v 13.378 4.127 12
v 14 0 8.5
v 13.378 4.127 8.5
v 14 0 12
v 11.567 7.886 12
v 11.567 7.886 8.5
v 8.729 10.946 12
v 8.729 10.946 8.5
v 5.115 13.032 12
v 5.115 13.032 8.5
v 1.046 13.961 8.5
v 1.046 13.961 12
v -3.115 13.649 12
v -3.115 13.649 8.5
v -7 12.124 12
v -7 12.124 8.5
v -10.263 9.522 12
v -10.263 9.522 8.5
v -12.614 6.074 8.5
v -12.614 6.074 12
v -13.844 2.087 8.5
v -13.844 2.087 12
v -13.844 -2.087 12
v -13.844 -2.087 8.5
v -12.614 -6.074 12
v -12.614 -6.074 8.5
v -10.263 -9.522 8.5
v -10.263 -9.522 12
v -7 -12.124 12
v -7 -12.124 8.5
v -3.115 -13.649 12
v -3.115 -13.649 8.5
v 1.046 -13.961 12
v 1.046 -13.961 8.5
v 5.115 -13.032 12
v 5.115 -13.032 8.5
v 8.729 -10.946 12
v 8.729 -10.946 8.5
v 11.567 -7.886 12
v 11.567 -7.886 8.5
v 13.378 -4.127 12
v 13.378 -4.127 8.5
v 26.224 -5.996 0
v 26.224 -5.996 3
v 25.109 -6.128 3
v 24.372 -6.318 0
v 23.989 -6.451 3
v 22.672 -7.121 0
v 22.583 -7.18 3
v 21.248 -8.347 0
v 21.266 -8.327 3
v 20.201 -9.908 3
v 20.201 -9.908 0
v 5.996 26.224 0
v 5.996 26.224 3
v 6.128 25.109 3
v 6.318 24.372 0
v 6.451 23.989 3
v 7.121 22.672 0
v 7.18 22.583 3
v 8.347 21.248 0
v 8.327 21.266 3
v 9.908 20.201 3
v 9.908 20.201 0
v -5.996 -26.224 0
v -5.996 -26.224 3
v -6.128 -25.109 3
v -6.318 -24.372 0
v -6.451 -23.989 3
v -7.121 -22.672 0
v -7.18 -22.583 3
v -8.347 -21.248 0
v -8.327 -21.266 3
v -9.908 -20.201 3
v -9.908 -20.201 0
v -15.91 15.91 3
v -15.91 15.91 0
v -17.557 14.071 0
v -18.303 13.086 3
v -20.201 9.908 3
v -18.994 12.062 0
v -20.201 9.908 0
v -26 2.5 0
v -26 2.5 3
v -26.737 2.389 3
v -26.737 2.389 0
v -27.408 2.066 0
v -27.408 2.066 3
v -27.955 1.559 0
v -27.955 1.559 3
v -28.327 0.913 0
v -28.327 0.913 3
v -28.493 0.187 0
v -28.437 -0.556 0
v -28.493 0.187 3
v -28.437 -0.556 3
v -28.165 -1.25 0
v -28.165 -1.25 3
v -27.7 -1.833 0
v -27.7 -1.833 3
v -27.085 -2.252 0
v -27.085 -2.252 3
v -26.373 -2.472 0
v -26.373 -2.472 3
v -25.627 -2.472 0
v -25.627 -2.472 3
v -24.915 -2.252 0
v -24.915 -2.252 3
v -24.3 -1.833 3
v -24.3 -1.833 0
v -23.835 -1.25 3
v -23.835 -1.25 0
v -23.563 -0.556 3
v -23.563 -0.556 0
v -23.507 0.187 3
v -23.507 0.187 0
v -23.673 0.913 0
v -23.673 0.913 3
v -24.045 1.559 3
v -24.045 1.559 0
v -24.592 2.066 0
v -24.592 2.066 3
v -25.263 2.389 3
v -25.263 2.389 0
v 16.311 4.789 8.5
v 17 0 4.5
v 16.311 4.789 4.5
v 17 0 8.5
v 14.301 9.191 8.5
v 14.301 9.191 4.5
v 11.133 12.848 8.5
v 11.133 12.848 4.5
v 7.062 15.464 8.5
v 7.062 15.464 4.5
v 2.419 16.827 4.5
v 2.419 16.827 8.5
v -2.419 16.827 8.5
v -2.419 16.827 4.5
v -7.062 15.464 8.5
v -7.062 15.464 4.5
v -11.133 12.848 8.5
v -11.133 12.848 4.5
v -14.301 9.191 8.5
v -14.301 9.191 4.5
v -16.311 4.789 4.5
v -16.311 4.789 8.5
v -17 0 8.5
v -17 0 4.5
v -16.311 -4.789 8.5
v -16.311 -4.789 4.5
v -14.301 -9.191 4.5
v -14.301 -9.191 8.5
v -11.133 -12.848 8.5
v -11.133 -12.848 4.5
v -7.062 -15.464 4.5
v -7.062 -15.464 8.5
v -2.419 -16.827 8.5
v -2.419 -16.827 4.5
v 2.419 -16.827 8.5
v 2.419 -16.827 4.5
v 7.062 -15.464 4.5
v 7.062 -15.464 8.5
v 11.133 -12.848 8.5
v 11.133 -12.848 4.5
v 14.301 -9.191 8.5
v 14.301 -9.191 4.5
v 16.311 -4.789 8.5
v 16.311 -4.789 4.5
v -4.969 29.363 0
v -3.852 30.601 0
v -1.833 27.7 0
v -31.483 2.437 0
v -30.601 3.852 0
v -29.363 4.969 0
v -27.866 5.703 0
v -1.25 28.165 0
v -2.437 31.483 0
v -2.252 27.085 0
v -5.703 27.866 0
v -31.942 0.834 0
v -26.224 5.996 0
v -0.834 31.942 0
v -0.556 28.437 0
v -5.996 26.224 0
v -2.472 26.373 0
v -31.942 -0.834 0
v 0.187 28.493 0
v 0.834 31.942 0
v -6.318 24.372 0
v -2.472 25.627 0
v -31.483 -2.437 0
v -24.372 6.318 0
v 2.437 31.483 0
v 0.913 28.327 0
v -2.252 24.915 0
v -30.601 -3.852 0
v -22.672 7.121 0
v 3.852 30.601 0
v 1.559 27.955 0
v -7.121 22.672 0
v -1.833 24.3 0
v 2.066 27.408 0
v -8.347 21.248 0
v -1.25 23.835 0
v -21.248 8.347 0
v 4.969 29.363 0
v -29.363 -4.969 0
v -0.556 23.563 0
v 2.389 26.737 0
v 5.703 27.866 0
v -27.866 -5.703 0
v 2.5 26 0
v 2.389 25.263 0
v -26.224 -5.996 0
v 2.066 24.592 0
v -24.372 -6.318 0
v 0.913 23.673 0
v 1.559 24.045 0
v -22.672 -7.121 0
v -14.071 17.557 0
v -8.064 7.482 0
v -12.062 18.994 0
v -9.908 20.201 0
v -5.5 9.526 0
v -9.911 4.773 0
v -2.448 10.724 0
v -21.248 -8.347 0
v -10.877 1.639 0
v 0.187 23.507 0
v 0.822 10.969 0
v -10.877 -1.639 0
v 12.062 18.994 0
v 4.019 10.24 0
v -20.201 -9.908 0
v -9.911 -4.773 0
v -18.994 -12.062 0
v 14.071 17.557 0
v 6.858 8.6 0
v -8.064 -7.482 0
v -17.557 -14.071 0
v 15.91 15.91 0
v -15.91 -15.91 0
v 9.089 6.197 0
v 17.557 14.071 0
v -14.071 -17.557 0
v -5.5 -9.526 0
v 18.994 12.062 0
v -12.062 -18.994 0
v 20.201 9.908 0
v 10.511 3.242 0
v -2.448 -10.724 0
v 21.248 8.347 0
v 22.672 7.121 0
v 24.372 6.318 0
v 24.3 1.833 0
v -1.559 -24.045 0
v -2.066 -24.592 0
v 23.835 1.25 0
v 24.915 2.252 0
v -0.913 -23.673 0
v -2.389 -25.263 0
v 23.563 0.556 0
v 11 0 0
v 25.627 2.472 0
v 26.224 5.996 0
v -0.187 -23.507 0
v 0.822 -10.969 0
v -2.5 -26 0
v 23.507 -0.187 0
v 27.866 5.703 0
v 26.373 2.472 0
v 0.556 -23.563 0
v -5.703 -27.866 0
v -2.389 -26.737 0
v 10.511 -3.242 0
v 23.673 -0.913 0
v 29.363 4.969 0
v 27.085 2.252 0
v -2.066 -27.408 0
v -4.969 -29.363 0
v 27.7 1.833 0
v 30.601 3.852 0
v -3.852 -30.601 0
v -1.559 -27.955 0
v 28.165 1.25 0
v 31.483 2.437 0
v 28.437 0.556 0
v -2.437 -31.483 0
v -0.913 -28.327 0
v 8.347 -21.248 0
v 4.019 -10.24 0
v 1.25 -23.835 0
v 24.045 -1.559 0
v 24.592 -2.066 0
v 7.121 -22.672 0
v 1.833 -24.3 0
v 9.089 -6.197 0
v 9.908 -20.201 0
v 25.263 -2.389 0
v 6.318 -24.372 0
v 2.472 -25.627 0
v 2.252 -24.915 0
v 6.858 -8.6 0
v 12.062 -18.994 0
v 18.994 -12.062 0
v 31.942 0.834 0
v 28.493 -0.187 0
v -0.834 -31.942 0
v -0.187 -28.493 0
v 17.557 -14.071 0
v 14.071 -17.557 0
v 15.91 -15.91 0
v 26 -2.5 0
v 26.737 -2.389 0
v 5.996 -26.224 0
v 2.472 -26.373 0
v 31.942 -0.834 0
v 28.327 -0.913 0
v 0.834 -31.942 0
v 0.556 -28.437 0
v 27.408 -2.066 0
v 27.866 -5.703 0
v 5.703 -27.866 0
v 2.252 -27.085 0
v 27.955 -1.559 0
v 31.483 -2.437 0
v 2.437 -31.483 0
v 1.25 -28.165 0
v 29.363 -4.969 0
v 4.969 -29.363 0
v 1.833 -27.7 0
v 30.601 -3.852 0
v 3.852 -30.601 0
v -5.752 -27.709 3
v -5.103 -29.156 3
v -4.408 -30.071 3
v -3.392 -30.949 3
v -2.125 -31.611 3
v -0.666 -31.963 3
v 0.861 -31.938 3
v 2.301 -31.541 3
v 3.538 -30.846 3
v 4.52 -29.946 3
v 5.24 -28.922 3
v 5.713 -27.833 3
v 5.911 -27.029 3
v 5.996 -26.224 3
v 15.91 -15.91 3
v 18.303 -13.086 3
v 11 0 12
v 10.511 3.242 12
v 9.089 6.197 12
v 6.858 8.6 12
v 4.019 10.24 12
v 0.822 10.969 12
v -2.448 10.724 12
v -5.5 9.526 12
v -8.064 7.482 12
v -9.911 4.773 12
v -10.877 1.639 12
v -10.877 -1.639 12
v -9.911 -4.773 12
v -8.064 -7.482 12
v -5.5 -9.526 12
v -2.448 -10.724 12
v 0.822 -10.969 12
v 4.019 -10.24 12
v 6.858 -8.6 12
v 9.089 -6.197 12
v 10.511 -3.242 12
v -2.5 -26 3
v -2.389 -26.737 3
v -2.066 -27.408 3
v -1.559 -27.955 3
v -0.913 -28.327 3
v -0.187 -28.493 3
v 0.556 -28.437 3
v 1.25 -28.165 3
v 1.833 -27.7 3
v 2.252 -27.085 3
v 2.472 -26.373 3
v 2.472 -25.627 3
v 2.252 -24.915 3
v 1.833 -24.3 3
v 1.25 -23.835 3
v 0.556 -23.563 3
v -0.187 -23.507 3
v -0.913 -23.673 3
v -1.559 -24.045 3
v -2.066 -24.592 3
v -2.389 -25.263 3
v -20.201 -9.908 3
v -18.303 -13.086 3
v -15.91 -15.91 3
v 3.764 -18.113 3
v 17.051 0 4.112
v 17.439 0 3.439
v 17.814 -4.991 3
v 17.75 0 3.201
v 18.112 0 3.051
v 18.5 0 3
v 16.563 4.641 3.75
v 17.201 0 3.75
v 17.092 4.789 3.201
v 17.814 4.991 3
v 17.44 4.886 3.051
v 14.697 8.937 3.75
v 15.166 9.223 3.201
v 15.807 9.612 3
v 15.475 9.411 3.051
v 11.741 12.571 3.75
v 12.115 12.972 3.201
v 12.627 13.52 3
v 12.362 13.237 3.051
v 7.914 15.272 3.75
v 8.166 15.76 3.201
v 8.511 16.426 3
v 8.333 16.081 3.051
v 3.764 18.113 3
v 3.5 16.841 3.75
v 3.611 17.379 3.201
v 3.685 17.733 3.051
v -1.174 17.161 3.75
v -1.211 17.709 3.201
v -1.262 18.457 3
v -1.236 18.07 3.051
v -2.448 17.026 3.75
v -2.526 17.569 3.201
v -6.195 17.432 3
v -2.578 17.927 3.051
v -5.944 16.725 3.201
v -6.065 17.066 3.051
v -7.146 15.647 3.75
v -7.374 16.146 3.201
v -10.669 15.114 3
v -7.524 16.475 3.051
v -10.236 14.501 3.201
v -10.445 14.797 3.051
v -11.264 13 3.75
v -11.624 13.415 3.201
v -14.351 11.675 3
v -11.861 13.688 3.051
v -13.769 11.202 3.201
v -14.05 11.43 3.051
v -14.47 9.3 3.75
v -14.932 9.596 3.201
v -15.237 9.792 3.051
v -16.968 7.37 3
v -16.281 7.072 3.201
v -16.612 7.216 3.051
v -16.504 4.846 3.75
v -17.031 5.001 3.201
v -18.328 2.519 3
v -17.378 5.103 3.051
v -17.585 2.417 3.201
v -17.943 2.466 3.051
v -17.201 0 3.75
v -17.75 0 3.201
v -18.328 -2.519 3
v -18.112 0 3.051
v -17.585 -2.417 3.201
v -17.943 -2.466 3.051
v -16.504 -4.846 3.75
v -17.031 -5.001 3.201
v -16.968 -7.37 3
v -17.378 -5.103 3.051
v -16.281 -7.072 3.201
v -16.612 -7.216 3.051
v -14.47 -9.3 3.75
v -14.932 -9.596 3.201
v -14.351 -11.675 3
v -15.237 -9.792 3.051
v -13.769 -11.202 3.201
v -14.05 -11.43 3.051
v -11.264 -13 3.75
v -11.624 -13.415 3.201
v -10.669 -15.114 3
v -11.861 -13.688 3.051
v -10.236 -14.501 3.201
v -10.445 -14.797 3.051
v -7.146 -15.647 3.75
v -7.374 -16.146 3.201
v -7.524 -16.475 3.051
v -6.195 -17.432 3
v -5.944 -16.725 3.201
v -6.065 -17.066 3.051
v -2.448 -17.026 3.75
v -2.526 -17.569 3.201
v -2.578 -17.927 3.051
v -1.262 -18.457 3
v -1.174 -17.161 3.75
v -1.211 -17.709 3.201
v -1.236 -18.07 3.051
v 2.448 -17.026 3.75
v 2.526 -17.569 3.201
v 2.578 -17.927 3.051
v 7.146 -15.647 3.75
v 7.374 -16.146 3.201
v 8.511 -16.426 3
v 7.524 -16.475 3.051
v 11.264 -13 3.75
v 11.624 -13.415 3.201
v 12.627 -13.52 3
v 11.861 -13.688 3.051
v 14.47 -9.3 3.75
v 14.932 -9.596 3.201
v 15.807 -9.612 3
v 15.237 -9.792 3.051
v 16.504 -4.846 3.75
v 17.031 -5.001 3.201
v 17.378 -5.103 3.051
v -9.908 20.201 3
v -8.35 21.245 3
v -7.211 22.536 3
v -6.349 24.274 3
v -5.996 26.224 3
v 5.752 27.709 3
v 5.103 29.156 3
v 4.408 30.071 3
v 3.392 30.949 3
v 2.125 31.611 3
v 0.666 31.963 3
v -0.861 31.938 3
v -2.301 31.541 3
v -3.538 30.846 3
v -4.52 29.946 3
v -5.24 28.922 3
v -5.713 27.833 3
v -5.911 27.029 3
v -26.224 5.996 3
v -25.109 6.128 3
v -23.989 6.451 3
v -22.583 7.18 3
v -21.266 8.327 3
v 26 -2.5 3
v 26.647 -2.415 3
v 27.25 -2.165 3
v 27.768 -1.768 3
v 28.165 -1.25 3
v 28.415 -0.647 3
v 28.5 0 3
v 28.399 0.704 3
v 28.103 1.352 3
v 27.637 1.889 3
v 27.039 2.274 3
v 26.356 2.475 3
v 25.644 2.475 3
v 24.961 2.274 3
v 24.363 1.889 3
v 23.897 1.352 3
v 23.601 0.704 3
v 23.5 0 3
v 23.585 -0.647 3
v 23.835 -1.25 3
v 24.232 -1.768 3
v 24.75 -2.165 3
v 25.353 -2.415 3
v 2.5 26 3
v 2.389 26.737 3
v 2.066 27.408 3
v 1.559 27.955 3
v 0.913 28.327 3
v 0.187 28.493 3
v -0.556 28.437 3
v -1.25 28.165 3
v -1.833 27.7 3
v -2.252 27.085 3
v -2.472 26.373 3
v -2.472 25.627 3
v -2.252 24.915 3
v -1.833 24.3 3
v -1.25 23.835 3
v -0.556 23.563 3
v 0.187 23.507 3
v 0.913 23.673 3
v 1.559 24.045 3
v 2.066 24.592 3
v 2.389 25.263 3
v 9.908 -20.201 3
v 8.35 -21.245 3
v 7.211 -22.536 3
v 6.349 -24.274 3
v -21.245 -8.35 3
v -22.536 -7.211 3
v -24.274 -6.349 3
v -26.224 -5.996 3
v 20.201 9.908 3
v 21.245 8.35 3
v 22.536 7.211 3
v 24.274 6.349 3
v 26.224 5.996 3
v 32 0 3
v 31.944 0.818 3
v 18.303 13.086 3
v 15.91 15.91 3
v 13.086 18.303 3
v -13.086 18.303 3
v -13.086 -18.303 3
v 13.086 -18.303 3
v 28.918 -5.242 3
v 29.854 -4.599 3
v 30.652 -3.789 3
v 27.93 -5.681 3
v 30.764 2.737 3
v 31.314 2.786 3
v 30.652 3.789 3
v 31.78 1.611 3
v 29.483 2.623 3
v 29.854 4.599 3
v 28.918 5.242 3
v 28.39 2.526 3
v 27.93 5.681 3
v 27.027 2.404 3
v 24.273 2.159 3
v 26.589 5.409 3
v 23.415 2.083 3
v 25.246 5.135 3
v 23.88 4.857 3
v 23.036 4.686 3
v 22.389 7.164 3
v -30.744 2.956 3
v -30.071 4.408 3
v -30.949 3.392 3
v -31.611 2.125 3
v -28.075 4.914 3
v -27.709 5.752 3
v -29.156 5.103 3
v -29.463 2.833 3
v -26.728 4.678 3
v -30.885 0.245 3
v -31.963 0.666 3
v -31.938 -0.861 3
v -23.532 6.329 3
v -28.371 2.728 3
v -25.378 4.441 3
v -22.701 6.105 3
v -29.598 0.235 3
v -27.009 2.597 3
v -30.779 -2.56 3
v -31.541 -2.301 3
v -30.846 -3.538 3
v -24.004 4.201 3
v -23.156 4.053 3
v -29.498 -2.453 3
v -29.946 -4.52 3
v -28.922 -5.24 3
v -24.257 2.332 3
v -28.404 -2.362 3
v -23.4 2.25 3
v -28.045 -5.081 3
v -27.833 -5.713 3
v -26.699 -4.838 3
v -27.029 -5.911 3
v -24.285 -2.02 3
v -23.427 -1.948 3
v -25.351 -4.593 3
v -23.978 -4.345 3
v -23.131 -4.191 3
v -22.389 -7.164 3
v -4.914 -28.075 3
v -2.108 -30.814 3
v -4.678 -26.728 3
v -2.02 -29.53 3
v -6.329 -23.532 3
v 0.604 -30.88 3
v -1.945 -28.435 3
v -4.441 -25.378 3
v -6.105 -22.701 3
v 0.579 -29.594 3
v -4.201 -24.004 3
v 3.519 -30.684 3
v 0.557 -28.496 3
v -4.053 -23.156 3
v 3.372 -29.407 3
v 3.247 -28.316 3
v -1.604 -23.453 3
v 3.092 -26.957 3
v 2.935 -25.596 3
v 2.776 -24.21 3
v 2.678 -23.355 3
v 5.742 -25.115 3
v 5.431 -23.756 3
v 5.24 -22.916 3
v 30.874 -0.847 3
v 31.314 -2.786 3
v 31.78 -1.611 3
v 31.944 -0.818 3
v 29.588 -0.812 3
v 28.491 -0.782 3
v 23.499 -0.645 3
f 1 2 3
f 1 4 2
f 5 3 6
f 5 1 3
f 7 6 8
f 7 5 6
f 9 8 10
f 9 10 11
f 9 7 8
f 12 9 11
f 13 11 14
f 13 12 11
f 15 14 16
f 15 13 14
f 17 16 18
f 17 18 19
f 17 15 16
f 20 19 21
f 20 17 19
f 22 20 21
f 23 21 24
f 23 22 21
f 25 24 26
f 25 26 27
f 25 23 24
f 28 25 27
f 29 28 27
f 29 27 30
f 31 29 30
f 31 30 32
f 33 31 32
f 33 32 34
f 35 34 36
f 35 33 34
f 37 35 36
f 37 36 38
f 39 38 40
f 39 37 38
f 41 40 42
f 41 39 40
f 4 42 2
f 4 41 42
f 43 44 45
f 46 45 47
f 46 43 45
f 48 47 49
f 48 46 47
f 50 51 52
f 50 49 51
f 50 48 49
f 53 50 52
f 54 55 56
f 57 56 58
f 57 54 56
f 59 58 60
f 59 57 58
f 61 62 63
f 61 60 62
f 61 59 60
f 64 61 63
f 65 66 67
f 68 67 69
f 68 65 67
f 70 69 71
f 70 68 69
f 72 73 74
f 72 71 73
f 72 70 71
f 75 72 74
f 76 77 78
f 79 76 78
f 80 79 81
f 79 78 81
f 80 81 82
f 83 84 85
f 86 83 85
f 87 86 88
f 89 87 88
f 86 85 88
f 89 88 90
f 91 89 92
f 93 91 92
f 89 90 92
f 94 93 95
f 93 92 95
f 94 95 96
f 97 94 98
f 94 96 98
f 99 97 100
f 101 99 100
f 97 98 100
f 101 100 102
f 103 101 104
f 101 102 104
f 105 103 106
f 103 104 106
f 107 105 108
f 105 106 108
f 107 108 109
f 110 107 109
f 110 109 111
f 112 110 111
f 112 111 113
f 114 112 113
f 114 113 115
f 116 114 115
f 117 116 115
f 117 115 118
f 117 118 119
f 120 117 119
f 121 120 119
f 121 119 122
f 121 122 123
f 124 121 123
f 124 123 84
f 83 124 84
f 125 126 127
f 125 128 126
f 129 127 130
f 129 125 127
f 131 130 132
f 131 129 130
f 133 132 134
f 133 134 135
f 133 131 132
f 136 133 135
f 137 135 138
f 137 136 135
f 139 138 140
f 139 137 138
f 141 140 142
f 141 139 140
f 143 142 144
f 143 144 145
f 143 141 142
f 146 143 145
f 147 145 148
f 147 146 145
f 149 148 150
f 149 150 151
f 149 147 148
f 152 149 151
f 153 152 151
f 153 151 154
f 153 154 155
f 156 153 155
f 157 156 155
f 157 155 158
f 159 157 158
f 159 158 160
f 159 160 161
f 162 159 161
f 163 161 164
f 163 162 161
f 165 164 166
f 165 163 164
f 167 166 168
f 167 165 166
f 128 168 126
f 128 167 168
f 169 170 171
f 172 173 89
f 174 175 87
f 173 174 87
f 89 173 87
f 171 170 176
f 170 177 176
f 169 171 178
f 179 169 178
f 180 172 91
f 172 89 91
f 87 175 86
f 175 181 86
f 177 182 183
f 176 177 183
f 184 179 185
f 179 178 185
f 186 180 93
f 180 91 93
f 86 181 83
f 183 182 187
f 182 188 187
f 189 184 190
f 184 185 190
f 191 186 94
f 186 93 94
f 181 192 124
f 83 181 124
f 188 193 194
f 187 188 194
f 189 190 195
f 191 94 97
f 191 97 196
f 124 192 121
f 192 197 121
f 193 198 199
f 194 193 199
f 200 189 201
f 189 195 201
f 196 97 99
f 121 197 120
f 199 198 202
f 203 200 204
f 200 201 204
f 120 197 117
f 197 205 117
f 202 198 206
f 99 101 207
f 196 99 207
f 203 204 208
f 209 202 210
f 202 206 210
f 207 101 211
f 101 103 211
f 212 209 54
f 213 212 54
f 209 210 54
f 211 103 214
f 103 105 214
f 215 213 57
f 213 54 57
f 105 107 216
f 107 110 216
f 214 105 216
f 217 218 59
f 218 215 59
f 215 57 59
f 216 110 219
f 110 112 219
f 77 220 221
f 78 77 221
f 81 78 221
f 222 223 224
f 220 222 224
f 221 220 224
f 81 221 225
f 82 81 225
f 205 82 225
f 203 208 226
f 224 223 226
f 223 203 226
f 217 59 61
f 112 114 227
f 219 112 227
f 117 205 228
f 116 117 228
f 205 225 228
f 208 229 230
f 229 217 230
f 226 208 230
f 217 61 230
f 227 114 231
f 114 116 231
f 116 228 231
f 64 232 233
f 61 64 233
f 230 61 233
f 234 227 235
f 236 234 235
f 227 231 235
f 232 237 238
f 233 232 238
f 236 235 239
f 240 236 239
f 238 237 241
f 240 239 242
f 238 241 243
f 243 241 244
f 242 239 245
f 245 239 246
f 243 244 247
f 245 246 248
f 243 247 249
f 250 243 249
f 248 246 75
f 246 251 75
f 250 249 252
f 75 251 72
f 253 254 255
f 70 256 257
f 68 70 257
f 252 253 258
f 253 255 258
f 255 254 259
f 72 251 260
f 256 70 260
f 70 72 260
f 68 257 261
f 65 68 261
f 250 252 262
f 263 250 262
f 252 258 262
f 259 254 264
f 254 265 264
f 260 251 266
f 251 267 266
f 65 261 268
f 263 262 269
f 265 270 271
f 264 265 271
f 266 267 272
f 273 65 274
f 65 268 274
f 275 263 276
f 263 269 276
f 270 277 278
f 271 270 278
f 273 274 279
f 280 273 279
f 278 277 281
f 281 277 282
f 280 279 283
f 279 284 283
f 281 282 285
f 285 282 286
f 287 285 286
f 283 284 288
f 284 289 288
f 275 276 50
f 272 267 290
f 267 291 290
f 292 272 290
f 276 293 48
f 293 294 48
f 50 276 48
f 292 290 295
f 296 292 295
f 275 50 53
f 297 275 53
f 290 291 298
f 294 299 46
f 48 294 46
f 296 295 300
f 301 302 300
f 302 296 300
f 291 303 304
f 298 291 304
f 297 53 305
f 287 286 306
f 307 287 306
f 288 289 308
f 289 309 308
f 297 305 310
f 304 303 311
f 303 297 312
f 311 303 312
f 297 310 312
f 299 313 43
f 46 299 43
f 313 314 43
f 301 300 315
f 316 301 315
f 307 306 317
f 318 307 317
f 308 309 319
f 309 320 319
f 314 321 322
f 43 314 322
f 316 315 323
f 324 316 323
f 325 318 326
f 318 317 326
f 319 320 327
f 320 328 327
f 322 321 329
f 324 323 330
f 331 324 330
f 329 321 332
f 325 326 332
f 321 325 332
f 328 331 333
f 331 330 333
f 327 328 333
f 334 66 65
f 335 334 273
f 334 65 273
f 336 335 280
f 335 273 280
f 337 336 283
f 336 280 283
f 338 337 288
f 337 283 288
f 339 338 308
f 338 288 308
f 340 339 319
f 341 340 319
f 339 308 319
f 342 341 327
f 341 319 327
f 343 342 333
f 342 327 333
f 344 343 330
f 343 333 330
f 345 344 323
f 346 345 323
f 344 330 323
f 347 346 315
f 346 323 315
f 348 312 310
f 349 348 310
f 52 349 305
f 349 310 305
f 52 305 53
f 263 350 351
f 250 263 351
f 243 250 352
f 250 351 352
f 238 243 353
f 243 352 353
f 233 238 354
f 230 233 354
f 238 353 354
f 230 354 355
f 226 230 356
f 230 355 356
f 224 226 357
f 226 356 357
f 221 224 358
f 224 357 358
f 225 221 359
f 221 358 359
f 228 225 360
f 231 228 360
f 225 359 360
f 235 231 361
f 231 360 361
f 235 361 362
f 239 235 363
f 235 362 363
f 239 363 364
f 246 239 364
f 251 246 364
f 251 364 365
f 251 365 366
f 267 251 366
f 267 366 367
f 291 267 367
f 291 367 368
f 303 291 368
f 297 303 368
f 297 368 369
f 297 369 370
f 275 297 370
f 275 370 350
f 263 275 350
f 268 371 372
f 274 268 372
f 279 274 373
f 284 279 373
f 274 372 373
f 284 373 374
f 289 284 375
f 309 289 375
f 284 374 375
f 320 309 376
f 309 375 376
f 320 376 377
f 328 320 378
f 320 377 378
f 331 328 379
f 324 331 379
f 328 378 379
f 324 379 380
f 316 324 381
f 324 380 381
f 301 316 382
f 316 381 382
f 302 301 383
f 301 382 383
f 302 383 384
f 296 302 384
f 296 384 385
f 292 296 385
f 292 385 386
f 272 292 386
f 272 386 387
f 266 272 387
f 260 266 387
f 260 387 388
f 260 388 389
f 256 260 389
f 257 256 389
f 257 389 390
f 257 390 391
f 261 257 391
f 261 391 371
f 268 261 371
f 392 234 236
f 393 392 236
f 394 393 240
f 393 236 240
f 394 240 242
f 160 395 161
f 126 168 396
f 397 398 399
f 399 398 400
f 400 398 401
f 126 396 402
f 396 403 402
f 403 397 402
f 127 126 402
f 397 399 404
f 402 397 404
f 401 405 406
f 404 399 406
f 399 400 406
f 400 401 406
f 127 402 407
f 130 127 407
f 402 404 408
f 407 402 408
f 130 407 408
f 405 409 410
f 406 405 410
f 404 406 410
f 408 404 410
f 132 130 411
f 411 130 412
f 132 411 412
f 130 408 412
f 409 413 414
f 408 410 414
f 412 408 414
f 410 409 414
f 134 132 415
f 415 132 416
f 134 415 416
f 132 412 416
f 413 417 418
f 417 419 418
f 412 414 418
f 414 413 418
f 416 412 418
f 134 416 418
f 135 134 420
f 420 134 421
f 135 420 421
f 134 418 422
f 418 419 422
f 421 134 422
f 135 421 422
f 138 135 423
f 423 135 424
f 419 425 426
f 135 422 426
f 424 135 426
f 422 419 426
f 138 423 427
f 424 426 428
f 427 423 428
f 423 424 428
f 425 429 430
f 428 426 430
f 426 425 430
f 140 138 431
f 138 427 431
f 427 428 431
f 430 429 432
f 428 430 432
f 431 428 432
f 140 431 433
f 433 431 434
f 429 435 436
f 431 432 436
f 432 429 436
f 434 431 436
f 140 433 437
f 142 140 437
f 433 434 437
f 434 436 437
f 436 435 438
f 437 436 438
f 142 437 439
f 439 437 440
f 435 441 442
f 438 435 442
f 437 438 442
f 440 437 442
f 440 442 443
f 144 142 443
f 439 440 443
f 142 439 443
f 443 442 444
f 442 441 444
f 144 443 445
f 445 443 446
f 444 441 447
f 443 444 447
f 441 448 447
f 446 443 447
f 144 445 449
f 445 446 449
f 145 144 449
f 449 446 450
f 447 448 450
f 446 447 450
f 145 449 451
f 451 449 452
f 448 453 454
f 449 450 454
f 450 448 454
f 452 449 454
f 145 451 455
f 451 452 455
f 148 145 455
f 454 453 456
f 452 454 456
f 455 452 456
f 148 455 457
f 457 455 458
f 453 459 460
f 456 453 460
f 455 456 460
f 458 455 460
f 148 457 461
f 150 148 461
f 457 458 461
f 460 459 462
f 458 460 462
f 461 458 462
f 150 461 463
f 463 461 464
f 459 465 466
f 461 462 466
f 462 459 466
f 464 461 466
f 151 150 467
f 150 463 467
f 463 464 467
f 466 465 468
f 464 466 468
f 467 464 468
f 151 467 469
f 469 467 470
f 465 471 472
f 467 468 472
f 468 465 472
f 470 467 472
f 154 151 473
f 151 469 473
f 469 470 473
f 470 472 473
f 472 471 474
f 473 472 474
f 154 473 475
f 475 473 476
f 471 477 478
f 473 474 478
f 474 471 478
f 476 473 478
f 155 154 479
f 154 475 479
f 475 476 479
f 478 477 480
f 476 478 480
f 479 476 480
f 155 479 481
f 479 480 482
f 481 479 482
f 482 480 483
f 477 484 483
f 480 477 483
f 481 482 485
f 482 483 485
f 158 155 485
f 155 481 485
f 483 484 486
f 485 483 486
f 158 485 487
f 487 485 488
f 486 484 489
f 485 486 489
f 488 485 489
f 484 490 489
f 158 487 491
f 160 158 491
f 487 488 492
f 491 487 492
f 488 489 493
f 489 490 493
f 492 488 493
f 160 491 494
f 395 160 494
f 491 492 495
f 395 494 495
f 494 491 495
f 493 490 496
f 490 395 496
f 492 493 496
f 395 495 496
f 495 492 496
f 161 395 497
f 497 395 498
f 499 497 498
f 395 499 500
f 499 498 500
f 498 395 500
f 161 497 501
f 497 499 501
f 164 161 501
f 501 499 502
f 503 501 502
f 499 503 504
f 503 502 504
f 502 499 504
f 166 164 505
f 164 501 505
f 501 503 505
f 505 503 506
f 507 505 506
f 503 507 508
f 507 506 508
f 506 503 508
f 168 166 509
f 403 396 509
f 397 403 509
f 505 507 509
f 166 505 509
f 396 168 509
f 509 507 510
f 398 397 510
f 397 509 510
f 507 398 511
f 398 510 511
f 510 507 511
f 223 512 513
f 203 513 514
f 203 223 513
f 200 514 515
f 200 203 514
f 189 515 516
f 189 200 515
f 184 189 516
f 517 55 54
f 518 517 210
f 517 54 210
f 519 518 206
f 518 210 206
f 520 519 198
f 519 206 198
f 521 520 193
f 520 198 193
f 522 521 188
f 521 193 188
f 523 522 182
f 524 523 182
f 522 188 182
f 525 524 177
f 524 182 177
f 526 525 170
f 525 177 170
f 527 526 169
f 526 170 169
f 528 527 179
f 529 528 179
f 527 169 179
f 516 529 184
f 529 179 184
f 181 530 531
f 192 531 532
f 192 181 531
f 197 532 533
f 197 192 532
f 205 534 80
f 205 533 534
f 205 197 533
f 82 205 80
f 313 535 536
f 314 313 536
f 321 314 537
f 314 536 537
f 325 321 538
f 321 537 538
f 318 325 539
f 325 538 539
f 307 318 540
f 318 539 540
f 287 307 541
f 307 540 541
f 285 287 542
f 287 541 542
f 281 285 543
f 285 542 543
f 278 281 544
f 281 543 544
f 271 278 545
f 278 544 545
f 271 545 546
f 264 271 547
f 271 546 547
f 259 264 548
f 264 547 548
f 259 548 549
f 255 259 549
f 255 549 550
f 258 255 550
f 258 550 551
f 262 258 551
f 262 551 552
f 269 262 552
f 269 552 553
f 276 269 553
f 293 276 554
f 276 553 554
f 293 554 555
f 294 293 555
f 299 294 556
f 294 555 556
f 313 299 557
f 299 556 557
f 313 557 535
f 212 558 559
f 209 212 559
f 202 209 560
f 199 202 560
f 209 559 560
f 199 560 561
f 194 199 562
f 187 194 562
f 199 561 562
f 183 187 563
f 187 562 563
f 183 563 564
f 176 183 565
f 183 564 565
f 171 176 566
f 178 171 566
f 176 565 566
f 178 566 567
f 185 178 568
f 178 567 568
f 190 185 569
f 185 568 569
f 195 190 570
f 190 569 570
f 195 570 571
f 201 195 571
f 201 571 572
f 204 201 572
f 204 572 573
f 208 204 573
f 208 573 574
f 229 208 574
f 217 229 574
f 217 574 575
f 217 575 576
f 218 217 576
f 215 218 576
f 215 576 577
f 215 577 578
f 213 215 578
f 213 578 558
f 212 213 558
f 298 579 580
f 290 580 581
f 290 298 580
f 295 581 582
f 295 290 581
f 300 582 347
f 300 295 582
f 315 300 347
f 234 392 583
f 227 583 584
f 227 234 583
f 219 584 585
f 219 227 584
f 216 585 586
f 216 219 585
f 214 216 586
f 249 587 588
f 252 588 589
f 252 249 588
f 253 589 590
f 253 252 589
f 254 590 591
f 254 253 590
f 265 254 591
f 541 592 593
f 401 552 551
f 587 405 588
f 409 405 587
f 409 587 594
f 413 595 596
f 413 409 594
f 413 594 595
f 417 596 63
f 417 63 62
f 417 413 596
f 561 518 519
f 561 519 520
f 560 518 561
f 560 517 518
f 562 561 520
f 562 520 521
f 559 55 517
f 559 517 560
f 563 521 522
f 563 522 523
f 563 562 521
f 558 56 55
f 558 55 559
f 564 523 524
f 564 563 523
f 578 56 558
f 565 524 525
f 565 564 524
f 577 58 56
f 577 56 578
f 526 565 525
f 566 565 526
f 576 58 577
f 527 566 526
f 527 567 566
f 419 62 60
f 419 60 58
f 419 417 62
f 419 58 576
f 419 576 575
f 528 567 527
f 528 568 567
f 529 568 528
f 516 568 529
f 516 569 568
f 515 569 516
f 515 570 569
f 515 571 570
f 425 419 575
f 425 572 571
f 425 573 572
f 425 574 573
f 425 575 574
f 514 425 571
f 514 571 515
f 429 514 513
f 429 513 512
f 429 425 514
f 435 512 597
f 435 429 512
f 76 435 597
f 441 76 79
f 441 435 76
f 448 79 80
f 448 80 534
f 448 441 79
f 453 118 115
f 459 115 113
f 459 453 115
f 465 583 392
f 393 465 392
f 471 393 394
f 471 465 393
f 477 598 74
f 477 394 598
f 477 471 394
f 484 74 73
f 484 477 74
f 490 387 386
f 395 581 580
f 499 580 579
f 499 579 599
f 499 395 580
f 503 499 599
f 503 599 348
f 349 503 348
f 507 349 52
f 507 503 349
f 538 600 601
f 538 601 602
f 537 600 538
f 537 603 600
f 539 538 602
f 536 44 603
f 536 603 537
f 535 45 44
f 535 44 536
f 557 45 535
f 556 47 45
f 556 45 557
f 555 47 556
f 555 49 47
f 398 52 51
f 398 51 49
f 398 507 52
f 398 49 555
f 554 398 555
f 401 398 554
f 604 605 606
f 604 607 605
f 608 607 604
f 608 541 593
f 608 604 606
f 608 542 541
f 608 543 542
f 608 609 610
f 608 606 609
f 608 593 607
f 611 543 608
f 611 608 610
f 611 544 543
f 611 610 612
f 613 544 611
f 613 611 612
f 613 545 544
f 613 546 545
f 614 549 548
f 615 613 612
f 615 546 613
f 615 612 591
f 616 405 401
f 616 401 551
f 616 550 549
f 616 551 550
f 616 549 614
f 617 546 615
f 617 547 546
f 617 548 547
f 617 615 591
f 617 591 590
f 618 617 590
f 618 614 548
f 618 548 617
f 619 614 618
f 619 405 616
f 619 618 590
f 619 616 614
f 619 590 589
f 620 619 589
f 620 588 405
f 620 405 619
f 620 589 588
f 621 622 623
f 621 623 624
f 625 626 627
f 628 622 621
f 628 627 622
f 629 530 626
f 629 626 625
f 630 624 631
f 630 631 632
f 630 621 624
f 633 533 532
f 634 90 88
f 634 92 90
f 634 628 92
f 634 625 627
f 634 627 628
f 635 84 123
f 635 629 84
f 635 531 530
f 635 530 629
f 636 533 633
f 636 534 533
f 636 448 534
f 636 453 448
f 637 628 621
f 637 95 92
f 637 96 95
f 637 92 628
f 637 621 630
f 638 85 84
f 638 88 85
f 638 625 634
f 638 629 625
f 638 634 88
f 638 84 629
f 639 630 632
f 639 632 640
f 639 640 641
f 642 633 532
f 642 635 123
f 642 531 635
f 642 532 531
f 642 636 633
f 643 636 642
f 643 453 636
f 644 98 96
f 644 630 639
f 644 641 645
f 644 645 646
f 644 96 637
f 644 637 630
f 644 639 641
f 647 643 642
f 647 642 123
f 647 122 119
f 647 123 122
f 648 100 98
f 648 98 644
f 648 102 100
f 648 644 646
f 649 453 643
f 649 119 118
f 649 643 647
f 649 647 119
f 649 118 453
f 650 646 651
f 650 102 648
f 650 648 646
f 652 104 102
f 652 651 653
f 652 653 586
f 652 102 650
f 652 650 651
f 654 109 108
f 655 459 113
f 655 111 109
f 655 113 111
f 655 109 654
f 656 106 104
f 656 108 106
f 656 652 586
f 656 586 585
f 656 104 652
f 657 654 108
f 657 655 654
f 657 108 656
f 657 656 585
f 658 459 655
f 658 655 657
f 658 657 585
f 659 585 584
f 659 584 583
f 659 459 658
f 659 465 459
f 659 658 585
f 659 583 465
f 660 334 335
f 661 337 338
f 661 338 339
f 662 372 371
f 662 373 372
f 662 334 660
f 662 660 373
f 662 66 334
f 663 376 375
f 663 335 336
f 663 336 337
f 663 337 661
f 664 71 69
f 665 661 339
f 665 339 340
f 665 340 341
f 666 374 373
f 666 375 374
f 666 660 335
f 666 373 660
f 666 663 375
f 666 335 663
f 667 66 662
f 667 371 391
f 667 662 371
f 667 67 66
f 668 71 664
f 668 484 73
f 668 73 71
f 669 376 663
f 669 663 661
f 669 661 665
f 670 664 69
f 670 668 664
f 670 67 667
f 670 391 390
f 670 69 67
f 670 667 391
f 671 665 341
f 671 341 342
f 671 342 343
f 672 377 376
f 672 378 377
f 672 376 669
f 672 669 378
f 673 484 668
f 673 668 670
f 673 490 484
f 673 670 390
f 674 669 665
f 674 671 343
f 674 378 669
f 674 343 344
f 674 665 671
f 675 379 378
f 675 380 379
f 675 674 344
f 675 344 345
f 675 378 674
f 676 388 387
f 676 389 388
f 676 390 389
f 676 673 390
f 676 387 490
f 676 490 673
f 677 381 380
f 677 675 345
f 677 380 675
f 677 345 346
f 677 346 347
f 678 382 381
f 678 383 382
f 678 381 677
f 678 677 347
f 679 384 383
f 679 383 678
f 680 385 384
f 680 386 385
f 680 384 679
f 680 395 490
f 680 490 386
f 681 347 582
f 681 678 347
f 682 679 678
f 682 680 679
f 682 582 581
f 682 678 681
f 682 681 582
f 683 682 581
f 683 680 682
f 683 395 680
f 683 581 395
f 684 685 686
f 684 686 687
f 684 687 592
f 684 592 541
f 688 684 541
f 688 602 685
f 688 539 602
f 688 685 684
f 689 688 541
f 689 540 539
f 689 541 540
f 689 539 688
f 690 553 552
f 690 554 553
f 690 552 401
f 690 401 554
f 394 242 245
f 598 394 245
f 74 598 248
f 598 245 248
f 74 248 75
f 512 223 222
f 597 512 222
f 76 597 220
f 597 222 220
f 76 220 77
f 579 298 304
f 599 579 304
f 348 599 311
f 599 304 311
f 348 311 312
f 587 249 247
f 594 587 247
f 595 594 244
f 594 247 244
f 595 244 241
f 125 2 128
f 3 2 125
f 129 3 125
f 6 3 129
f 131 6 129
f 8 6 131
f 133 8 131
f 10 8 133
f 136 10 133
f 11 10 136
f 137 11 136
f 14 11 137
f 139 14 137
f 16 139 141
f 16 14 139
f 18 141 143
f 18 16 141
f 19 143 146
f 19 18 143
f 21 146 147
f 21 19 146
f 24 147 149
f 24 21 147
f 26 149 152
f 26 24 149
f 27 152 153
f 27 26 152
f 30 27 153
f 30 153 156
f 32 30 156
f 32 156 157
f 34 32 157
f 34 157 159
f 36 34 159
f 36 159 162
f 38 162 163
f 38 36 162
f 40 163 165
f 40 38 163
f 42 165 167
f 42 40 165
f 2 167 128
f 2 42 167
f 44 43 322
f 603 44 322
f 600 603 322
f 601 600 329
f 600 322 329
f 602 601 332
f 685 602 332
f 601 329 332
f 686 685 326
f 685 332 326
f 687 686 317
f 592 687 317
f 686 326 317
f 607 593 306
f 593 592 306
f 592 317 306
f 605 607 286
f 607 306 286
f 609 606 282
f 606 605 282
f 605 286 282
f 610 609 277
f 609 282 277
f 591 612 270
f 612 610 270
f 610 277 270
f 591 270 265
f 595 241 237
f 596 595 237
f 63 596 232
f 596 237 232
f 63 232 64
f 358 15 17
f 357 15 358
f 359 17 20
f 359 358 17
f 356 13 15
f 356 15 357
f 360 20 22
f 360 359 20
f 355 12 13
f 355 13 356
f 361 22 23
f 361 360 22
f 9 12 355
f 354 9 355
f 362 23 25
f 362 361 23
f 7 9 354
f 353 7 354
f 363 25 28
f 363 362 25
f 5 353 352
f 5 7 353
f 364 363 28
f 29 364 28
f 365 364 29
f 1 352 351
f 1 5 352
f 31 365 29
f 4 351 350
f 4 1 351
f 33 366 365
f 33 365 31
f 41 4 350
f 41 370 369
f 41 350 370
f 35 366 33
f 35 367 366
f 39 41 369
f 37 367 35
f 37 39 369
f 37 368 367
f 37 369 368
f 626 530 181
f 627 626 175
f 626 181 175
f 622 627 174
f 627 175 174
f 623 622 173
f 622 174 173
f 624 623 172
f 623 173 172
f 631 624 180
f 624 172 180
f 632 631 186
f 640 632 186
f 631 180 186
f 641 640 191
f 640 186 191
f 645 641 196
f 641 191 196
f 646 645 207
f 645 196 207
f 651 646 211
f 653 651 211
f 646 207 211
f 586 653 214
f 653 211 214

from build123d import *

# Parameters (mm, degrees)
PAD_DEPTH             = 12
POLARPATTERN_COUNT    = 4
SKETCH003_R           = 11
POCKET_DEPTH          = 12.001
SKETCH004_R           = 2.5
POCKET001_DEPTH       = 185.604396
POLARPATTERN001_COUNT = 4


with BuildPart() as part:
    # Sketch → Pad (new body)
    with BuildSketch(Plane.XY):
        with BuildLine():
            ThreePointArc((15.909903, 15.909903), (13.086202, 18.303041), (9.908356, 20.200854))
            ThreePointArc((5.995813, 26.224112), (7.120676, 22.672423), (9.908356, 20.200854))
            ThreePointArc((5.995813, 26.224112), (0, 32), (-5.995813, 26.224112))
            ThreePointArc((-9.908356, 20.200854), (-7.120676, 22.672423), (-5.995813, 26.224112))
            ThreePointArc((-9.908356, 20.200854), (-13.086202, 18.303041), (-15.909903, 15.909903))
            Line((-15.909903, 15.909903), (0, 0))
            Line((0, 0), (15.909903, 15.909903))
        make_face()
    pad = extrude(amount=PAD_DEPTH)

    # PolarPattern: Pad ×4 about axis
    polarpattern_axis = Axis((0, 0, 0), (0, 0, 1))
    for i in range(1, POLARPATTERN_COUNT):
        add(pad.rotate(polarpattern_axis, i * 360 / POLARPATTERN_COUNT))

    # SubtractivePipe: sweep along a path in Sketch002
    with BuildLine(Plane.XY.offset(12)) as subtractivepipe_path:
        CenterArc((0, 0), 14, 0, 360)
    # Sketch001 → SubtractivePipe (sweep, cut)
    with BuildSketch(Plane.YZ):
        with BuildLine():
            Line((-14, 12), (-32, 12))
            Line((-32, 12), (-32, 3))
            Line((-32, 3), (-18.5, 3))
            ThreePointArc((-18.5, 3), (-17.43934, 3.43934), (-17, 4.5))
            Line((-17, 4.5), (-17, 8.5))
            Line((-17, 8.5), (-14, 8.5))
            Line((-14, 8.5), (-14, 12))
        make_face()
    sweep(path=subtractivepipe_path.line, mode=Mode.SUBTRACT)

    # Sketch003 (on Face31 of SubtractivePipe) → Pocket (cut, through all)
    with BuildSketch(Plane.XY.offset(12)):
        Circle(SKETCH003_R)
    extrude(amount=-POCKET_DEPTH, mode=Mode.SUBTRACT)

    # Sketch004 (on Face4 of Pocket) → Pocket001 (cut, through all)
    with BuildSketch(Plane.XY.offset(3)):
        with Locations((0, 26)):
            Circle(SKETCH004_R)
    pocket001 = extrude(amount=-POCKET001_DEPTH, mode=Mode.SUBTRACT)

    # PolarPattern001: Pocket001 ×4 about axis
    polarpattern001_axis = Axis((0, 0, 3), (0, 0, 1))
    for i in range(1, POLARPATTERN001_COUNT):
        add(pocket001.rotate(polarpattern001_axis, i * 360 / POLARPATTERN001_COUNT), mode=Mode.SUBTRACT)


solid = part.part
